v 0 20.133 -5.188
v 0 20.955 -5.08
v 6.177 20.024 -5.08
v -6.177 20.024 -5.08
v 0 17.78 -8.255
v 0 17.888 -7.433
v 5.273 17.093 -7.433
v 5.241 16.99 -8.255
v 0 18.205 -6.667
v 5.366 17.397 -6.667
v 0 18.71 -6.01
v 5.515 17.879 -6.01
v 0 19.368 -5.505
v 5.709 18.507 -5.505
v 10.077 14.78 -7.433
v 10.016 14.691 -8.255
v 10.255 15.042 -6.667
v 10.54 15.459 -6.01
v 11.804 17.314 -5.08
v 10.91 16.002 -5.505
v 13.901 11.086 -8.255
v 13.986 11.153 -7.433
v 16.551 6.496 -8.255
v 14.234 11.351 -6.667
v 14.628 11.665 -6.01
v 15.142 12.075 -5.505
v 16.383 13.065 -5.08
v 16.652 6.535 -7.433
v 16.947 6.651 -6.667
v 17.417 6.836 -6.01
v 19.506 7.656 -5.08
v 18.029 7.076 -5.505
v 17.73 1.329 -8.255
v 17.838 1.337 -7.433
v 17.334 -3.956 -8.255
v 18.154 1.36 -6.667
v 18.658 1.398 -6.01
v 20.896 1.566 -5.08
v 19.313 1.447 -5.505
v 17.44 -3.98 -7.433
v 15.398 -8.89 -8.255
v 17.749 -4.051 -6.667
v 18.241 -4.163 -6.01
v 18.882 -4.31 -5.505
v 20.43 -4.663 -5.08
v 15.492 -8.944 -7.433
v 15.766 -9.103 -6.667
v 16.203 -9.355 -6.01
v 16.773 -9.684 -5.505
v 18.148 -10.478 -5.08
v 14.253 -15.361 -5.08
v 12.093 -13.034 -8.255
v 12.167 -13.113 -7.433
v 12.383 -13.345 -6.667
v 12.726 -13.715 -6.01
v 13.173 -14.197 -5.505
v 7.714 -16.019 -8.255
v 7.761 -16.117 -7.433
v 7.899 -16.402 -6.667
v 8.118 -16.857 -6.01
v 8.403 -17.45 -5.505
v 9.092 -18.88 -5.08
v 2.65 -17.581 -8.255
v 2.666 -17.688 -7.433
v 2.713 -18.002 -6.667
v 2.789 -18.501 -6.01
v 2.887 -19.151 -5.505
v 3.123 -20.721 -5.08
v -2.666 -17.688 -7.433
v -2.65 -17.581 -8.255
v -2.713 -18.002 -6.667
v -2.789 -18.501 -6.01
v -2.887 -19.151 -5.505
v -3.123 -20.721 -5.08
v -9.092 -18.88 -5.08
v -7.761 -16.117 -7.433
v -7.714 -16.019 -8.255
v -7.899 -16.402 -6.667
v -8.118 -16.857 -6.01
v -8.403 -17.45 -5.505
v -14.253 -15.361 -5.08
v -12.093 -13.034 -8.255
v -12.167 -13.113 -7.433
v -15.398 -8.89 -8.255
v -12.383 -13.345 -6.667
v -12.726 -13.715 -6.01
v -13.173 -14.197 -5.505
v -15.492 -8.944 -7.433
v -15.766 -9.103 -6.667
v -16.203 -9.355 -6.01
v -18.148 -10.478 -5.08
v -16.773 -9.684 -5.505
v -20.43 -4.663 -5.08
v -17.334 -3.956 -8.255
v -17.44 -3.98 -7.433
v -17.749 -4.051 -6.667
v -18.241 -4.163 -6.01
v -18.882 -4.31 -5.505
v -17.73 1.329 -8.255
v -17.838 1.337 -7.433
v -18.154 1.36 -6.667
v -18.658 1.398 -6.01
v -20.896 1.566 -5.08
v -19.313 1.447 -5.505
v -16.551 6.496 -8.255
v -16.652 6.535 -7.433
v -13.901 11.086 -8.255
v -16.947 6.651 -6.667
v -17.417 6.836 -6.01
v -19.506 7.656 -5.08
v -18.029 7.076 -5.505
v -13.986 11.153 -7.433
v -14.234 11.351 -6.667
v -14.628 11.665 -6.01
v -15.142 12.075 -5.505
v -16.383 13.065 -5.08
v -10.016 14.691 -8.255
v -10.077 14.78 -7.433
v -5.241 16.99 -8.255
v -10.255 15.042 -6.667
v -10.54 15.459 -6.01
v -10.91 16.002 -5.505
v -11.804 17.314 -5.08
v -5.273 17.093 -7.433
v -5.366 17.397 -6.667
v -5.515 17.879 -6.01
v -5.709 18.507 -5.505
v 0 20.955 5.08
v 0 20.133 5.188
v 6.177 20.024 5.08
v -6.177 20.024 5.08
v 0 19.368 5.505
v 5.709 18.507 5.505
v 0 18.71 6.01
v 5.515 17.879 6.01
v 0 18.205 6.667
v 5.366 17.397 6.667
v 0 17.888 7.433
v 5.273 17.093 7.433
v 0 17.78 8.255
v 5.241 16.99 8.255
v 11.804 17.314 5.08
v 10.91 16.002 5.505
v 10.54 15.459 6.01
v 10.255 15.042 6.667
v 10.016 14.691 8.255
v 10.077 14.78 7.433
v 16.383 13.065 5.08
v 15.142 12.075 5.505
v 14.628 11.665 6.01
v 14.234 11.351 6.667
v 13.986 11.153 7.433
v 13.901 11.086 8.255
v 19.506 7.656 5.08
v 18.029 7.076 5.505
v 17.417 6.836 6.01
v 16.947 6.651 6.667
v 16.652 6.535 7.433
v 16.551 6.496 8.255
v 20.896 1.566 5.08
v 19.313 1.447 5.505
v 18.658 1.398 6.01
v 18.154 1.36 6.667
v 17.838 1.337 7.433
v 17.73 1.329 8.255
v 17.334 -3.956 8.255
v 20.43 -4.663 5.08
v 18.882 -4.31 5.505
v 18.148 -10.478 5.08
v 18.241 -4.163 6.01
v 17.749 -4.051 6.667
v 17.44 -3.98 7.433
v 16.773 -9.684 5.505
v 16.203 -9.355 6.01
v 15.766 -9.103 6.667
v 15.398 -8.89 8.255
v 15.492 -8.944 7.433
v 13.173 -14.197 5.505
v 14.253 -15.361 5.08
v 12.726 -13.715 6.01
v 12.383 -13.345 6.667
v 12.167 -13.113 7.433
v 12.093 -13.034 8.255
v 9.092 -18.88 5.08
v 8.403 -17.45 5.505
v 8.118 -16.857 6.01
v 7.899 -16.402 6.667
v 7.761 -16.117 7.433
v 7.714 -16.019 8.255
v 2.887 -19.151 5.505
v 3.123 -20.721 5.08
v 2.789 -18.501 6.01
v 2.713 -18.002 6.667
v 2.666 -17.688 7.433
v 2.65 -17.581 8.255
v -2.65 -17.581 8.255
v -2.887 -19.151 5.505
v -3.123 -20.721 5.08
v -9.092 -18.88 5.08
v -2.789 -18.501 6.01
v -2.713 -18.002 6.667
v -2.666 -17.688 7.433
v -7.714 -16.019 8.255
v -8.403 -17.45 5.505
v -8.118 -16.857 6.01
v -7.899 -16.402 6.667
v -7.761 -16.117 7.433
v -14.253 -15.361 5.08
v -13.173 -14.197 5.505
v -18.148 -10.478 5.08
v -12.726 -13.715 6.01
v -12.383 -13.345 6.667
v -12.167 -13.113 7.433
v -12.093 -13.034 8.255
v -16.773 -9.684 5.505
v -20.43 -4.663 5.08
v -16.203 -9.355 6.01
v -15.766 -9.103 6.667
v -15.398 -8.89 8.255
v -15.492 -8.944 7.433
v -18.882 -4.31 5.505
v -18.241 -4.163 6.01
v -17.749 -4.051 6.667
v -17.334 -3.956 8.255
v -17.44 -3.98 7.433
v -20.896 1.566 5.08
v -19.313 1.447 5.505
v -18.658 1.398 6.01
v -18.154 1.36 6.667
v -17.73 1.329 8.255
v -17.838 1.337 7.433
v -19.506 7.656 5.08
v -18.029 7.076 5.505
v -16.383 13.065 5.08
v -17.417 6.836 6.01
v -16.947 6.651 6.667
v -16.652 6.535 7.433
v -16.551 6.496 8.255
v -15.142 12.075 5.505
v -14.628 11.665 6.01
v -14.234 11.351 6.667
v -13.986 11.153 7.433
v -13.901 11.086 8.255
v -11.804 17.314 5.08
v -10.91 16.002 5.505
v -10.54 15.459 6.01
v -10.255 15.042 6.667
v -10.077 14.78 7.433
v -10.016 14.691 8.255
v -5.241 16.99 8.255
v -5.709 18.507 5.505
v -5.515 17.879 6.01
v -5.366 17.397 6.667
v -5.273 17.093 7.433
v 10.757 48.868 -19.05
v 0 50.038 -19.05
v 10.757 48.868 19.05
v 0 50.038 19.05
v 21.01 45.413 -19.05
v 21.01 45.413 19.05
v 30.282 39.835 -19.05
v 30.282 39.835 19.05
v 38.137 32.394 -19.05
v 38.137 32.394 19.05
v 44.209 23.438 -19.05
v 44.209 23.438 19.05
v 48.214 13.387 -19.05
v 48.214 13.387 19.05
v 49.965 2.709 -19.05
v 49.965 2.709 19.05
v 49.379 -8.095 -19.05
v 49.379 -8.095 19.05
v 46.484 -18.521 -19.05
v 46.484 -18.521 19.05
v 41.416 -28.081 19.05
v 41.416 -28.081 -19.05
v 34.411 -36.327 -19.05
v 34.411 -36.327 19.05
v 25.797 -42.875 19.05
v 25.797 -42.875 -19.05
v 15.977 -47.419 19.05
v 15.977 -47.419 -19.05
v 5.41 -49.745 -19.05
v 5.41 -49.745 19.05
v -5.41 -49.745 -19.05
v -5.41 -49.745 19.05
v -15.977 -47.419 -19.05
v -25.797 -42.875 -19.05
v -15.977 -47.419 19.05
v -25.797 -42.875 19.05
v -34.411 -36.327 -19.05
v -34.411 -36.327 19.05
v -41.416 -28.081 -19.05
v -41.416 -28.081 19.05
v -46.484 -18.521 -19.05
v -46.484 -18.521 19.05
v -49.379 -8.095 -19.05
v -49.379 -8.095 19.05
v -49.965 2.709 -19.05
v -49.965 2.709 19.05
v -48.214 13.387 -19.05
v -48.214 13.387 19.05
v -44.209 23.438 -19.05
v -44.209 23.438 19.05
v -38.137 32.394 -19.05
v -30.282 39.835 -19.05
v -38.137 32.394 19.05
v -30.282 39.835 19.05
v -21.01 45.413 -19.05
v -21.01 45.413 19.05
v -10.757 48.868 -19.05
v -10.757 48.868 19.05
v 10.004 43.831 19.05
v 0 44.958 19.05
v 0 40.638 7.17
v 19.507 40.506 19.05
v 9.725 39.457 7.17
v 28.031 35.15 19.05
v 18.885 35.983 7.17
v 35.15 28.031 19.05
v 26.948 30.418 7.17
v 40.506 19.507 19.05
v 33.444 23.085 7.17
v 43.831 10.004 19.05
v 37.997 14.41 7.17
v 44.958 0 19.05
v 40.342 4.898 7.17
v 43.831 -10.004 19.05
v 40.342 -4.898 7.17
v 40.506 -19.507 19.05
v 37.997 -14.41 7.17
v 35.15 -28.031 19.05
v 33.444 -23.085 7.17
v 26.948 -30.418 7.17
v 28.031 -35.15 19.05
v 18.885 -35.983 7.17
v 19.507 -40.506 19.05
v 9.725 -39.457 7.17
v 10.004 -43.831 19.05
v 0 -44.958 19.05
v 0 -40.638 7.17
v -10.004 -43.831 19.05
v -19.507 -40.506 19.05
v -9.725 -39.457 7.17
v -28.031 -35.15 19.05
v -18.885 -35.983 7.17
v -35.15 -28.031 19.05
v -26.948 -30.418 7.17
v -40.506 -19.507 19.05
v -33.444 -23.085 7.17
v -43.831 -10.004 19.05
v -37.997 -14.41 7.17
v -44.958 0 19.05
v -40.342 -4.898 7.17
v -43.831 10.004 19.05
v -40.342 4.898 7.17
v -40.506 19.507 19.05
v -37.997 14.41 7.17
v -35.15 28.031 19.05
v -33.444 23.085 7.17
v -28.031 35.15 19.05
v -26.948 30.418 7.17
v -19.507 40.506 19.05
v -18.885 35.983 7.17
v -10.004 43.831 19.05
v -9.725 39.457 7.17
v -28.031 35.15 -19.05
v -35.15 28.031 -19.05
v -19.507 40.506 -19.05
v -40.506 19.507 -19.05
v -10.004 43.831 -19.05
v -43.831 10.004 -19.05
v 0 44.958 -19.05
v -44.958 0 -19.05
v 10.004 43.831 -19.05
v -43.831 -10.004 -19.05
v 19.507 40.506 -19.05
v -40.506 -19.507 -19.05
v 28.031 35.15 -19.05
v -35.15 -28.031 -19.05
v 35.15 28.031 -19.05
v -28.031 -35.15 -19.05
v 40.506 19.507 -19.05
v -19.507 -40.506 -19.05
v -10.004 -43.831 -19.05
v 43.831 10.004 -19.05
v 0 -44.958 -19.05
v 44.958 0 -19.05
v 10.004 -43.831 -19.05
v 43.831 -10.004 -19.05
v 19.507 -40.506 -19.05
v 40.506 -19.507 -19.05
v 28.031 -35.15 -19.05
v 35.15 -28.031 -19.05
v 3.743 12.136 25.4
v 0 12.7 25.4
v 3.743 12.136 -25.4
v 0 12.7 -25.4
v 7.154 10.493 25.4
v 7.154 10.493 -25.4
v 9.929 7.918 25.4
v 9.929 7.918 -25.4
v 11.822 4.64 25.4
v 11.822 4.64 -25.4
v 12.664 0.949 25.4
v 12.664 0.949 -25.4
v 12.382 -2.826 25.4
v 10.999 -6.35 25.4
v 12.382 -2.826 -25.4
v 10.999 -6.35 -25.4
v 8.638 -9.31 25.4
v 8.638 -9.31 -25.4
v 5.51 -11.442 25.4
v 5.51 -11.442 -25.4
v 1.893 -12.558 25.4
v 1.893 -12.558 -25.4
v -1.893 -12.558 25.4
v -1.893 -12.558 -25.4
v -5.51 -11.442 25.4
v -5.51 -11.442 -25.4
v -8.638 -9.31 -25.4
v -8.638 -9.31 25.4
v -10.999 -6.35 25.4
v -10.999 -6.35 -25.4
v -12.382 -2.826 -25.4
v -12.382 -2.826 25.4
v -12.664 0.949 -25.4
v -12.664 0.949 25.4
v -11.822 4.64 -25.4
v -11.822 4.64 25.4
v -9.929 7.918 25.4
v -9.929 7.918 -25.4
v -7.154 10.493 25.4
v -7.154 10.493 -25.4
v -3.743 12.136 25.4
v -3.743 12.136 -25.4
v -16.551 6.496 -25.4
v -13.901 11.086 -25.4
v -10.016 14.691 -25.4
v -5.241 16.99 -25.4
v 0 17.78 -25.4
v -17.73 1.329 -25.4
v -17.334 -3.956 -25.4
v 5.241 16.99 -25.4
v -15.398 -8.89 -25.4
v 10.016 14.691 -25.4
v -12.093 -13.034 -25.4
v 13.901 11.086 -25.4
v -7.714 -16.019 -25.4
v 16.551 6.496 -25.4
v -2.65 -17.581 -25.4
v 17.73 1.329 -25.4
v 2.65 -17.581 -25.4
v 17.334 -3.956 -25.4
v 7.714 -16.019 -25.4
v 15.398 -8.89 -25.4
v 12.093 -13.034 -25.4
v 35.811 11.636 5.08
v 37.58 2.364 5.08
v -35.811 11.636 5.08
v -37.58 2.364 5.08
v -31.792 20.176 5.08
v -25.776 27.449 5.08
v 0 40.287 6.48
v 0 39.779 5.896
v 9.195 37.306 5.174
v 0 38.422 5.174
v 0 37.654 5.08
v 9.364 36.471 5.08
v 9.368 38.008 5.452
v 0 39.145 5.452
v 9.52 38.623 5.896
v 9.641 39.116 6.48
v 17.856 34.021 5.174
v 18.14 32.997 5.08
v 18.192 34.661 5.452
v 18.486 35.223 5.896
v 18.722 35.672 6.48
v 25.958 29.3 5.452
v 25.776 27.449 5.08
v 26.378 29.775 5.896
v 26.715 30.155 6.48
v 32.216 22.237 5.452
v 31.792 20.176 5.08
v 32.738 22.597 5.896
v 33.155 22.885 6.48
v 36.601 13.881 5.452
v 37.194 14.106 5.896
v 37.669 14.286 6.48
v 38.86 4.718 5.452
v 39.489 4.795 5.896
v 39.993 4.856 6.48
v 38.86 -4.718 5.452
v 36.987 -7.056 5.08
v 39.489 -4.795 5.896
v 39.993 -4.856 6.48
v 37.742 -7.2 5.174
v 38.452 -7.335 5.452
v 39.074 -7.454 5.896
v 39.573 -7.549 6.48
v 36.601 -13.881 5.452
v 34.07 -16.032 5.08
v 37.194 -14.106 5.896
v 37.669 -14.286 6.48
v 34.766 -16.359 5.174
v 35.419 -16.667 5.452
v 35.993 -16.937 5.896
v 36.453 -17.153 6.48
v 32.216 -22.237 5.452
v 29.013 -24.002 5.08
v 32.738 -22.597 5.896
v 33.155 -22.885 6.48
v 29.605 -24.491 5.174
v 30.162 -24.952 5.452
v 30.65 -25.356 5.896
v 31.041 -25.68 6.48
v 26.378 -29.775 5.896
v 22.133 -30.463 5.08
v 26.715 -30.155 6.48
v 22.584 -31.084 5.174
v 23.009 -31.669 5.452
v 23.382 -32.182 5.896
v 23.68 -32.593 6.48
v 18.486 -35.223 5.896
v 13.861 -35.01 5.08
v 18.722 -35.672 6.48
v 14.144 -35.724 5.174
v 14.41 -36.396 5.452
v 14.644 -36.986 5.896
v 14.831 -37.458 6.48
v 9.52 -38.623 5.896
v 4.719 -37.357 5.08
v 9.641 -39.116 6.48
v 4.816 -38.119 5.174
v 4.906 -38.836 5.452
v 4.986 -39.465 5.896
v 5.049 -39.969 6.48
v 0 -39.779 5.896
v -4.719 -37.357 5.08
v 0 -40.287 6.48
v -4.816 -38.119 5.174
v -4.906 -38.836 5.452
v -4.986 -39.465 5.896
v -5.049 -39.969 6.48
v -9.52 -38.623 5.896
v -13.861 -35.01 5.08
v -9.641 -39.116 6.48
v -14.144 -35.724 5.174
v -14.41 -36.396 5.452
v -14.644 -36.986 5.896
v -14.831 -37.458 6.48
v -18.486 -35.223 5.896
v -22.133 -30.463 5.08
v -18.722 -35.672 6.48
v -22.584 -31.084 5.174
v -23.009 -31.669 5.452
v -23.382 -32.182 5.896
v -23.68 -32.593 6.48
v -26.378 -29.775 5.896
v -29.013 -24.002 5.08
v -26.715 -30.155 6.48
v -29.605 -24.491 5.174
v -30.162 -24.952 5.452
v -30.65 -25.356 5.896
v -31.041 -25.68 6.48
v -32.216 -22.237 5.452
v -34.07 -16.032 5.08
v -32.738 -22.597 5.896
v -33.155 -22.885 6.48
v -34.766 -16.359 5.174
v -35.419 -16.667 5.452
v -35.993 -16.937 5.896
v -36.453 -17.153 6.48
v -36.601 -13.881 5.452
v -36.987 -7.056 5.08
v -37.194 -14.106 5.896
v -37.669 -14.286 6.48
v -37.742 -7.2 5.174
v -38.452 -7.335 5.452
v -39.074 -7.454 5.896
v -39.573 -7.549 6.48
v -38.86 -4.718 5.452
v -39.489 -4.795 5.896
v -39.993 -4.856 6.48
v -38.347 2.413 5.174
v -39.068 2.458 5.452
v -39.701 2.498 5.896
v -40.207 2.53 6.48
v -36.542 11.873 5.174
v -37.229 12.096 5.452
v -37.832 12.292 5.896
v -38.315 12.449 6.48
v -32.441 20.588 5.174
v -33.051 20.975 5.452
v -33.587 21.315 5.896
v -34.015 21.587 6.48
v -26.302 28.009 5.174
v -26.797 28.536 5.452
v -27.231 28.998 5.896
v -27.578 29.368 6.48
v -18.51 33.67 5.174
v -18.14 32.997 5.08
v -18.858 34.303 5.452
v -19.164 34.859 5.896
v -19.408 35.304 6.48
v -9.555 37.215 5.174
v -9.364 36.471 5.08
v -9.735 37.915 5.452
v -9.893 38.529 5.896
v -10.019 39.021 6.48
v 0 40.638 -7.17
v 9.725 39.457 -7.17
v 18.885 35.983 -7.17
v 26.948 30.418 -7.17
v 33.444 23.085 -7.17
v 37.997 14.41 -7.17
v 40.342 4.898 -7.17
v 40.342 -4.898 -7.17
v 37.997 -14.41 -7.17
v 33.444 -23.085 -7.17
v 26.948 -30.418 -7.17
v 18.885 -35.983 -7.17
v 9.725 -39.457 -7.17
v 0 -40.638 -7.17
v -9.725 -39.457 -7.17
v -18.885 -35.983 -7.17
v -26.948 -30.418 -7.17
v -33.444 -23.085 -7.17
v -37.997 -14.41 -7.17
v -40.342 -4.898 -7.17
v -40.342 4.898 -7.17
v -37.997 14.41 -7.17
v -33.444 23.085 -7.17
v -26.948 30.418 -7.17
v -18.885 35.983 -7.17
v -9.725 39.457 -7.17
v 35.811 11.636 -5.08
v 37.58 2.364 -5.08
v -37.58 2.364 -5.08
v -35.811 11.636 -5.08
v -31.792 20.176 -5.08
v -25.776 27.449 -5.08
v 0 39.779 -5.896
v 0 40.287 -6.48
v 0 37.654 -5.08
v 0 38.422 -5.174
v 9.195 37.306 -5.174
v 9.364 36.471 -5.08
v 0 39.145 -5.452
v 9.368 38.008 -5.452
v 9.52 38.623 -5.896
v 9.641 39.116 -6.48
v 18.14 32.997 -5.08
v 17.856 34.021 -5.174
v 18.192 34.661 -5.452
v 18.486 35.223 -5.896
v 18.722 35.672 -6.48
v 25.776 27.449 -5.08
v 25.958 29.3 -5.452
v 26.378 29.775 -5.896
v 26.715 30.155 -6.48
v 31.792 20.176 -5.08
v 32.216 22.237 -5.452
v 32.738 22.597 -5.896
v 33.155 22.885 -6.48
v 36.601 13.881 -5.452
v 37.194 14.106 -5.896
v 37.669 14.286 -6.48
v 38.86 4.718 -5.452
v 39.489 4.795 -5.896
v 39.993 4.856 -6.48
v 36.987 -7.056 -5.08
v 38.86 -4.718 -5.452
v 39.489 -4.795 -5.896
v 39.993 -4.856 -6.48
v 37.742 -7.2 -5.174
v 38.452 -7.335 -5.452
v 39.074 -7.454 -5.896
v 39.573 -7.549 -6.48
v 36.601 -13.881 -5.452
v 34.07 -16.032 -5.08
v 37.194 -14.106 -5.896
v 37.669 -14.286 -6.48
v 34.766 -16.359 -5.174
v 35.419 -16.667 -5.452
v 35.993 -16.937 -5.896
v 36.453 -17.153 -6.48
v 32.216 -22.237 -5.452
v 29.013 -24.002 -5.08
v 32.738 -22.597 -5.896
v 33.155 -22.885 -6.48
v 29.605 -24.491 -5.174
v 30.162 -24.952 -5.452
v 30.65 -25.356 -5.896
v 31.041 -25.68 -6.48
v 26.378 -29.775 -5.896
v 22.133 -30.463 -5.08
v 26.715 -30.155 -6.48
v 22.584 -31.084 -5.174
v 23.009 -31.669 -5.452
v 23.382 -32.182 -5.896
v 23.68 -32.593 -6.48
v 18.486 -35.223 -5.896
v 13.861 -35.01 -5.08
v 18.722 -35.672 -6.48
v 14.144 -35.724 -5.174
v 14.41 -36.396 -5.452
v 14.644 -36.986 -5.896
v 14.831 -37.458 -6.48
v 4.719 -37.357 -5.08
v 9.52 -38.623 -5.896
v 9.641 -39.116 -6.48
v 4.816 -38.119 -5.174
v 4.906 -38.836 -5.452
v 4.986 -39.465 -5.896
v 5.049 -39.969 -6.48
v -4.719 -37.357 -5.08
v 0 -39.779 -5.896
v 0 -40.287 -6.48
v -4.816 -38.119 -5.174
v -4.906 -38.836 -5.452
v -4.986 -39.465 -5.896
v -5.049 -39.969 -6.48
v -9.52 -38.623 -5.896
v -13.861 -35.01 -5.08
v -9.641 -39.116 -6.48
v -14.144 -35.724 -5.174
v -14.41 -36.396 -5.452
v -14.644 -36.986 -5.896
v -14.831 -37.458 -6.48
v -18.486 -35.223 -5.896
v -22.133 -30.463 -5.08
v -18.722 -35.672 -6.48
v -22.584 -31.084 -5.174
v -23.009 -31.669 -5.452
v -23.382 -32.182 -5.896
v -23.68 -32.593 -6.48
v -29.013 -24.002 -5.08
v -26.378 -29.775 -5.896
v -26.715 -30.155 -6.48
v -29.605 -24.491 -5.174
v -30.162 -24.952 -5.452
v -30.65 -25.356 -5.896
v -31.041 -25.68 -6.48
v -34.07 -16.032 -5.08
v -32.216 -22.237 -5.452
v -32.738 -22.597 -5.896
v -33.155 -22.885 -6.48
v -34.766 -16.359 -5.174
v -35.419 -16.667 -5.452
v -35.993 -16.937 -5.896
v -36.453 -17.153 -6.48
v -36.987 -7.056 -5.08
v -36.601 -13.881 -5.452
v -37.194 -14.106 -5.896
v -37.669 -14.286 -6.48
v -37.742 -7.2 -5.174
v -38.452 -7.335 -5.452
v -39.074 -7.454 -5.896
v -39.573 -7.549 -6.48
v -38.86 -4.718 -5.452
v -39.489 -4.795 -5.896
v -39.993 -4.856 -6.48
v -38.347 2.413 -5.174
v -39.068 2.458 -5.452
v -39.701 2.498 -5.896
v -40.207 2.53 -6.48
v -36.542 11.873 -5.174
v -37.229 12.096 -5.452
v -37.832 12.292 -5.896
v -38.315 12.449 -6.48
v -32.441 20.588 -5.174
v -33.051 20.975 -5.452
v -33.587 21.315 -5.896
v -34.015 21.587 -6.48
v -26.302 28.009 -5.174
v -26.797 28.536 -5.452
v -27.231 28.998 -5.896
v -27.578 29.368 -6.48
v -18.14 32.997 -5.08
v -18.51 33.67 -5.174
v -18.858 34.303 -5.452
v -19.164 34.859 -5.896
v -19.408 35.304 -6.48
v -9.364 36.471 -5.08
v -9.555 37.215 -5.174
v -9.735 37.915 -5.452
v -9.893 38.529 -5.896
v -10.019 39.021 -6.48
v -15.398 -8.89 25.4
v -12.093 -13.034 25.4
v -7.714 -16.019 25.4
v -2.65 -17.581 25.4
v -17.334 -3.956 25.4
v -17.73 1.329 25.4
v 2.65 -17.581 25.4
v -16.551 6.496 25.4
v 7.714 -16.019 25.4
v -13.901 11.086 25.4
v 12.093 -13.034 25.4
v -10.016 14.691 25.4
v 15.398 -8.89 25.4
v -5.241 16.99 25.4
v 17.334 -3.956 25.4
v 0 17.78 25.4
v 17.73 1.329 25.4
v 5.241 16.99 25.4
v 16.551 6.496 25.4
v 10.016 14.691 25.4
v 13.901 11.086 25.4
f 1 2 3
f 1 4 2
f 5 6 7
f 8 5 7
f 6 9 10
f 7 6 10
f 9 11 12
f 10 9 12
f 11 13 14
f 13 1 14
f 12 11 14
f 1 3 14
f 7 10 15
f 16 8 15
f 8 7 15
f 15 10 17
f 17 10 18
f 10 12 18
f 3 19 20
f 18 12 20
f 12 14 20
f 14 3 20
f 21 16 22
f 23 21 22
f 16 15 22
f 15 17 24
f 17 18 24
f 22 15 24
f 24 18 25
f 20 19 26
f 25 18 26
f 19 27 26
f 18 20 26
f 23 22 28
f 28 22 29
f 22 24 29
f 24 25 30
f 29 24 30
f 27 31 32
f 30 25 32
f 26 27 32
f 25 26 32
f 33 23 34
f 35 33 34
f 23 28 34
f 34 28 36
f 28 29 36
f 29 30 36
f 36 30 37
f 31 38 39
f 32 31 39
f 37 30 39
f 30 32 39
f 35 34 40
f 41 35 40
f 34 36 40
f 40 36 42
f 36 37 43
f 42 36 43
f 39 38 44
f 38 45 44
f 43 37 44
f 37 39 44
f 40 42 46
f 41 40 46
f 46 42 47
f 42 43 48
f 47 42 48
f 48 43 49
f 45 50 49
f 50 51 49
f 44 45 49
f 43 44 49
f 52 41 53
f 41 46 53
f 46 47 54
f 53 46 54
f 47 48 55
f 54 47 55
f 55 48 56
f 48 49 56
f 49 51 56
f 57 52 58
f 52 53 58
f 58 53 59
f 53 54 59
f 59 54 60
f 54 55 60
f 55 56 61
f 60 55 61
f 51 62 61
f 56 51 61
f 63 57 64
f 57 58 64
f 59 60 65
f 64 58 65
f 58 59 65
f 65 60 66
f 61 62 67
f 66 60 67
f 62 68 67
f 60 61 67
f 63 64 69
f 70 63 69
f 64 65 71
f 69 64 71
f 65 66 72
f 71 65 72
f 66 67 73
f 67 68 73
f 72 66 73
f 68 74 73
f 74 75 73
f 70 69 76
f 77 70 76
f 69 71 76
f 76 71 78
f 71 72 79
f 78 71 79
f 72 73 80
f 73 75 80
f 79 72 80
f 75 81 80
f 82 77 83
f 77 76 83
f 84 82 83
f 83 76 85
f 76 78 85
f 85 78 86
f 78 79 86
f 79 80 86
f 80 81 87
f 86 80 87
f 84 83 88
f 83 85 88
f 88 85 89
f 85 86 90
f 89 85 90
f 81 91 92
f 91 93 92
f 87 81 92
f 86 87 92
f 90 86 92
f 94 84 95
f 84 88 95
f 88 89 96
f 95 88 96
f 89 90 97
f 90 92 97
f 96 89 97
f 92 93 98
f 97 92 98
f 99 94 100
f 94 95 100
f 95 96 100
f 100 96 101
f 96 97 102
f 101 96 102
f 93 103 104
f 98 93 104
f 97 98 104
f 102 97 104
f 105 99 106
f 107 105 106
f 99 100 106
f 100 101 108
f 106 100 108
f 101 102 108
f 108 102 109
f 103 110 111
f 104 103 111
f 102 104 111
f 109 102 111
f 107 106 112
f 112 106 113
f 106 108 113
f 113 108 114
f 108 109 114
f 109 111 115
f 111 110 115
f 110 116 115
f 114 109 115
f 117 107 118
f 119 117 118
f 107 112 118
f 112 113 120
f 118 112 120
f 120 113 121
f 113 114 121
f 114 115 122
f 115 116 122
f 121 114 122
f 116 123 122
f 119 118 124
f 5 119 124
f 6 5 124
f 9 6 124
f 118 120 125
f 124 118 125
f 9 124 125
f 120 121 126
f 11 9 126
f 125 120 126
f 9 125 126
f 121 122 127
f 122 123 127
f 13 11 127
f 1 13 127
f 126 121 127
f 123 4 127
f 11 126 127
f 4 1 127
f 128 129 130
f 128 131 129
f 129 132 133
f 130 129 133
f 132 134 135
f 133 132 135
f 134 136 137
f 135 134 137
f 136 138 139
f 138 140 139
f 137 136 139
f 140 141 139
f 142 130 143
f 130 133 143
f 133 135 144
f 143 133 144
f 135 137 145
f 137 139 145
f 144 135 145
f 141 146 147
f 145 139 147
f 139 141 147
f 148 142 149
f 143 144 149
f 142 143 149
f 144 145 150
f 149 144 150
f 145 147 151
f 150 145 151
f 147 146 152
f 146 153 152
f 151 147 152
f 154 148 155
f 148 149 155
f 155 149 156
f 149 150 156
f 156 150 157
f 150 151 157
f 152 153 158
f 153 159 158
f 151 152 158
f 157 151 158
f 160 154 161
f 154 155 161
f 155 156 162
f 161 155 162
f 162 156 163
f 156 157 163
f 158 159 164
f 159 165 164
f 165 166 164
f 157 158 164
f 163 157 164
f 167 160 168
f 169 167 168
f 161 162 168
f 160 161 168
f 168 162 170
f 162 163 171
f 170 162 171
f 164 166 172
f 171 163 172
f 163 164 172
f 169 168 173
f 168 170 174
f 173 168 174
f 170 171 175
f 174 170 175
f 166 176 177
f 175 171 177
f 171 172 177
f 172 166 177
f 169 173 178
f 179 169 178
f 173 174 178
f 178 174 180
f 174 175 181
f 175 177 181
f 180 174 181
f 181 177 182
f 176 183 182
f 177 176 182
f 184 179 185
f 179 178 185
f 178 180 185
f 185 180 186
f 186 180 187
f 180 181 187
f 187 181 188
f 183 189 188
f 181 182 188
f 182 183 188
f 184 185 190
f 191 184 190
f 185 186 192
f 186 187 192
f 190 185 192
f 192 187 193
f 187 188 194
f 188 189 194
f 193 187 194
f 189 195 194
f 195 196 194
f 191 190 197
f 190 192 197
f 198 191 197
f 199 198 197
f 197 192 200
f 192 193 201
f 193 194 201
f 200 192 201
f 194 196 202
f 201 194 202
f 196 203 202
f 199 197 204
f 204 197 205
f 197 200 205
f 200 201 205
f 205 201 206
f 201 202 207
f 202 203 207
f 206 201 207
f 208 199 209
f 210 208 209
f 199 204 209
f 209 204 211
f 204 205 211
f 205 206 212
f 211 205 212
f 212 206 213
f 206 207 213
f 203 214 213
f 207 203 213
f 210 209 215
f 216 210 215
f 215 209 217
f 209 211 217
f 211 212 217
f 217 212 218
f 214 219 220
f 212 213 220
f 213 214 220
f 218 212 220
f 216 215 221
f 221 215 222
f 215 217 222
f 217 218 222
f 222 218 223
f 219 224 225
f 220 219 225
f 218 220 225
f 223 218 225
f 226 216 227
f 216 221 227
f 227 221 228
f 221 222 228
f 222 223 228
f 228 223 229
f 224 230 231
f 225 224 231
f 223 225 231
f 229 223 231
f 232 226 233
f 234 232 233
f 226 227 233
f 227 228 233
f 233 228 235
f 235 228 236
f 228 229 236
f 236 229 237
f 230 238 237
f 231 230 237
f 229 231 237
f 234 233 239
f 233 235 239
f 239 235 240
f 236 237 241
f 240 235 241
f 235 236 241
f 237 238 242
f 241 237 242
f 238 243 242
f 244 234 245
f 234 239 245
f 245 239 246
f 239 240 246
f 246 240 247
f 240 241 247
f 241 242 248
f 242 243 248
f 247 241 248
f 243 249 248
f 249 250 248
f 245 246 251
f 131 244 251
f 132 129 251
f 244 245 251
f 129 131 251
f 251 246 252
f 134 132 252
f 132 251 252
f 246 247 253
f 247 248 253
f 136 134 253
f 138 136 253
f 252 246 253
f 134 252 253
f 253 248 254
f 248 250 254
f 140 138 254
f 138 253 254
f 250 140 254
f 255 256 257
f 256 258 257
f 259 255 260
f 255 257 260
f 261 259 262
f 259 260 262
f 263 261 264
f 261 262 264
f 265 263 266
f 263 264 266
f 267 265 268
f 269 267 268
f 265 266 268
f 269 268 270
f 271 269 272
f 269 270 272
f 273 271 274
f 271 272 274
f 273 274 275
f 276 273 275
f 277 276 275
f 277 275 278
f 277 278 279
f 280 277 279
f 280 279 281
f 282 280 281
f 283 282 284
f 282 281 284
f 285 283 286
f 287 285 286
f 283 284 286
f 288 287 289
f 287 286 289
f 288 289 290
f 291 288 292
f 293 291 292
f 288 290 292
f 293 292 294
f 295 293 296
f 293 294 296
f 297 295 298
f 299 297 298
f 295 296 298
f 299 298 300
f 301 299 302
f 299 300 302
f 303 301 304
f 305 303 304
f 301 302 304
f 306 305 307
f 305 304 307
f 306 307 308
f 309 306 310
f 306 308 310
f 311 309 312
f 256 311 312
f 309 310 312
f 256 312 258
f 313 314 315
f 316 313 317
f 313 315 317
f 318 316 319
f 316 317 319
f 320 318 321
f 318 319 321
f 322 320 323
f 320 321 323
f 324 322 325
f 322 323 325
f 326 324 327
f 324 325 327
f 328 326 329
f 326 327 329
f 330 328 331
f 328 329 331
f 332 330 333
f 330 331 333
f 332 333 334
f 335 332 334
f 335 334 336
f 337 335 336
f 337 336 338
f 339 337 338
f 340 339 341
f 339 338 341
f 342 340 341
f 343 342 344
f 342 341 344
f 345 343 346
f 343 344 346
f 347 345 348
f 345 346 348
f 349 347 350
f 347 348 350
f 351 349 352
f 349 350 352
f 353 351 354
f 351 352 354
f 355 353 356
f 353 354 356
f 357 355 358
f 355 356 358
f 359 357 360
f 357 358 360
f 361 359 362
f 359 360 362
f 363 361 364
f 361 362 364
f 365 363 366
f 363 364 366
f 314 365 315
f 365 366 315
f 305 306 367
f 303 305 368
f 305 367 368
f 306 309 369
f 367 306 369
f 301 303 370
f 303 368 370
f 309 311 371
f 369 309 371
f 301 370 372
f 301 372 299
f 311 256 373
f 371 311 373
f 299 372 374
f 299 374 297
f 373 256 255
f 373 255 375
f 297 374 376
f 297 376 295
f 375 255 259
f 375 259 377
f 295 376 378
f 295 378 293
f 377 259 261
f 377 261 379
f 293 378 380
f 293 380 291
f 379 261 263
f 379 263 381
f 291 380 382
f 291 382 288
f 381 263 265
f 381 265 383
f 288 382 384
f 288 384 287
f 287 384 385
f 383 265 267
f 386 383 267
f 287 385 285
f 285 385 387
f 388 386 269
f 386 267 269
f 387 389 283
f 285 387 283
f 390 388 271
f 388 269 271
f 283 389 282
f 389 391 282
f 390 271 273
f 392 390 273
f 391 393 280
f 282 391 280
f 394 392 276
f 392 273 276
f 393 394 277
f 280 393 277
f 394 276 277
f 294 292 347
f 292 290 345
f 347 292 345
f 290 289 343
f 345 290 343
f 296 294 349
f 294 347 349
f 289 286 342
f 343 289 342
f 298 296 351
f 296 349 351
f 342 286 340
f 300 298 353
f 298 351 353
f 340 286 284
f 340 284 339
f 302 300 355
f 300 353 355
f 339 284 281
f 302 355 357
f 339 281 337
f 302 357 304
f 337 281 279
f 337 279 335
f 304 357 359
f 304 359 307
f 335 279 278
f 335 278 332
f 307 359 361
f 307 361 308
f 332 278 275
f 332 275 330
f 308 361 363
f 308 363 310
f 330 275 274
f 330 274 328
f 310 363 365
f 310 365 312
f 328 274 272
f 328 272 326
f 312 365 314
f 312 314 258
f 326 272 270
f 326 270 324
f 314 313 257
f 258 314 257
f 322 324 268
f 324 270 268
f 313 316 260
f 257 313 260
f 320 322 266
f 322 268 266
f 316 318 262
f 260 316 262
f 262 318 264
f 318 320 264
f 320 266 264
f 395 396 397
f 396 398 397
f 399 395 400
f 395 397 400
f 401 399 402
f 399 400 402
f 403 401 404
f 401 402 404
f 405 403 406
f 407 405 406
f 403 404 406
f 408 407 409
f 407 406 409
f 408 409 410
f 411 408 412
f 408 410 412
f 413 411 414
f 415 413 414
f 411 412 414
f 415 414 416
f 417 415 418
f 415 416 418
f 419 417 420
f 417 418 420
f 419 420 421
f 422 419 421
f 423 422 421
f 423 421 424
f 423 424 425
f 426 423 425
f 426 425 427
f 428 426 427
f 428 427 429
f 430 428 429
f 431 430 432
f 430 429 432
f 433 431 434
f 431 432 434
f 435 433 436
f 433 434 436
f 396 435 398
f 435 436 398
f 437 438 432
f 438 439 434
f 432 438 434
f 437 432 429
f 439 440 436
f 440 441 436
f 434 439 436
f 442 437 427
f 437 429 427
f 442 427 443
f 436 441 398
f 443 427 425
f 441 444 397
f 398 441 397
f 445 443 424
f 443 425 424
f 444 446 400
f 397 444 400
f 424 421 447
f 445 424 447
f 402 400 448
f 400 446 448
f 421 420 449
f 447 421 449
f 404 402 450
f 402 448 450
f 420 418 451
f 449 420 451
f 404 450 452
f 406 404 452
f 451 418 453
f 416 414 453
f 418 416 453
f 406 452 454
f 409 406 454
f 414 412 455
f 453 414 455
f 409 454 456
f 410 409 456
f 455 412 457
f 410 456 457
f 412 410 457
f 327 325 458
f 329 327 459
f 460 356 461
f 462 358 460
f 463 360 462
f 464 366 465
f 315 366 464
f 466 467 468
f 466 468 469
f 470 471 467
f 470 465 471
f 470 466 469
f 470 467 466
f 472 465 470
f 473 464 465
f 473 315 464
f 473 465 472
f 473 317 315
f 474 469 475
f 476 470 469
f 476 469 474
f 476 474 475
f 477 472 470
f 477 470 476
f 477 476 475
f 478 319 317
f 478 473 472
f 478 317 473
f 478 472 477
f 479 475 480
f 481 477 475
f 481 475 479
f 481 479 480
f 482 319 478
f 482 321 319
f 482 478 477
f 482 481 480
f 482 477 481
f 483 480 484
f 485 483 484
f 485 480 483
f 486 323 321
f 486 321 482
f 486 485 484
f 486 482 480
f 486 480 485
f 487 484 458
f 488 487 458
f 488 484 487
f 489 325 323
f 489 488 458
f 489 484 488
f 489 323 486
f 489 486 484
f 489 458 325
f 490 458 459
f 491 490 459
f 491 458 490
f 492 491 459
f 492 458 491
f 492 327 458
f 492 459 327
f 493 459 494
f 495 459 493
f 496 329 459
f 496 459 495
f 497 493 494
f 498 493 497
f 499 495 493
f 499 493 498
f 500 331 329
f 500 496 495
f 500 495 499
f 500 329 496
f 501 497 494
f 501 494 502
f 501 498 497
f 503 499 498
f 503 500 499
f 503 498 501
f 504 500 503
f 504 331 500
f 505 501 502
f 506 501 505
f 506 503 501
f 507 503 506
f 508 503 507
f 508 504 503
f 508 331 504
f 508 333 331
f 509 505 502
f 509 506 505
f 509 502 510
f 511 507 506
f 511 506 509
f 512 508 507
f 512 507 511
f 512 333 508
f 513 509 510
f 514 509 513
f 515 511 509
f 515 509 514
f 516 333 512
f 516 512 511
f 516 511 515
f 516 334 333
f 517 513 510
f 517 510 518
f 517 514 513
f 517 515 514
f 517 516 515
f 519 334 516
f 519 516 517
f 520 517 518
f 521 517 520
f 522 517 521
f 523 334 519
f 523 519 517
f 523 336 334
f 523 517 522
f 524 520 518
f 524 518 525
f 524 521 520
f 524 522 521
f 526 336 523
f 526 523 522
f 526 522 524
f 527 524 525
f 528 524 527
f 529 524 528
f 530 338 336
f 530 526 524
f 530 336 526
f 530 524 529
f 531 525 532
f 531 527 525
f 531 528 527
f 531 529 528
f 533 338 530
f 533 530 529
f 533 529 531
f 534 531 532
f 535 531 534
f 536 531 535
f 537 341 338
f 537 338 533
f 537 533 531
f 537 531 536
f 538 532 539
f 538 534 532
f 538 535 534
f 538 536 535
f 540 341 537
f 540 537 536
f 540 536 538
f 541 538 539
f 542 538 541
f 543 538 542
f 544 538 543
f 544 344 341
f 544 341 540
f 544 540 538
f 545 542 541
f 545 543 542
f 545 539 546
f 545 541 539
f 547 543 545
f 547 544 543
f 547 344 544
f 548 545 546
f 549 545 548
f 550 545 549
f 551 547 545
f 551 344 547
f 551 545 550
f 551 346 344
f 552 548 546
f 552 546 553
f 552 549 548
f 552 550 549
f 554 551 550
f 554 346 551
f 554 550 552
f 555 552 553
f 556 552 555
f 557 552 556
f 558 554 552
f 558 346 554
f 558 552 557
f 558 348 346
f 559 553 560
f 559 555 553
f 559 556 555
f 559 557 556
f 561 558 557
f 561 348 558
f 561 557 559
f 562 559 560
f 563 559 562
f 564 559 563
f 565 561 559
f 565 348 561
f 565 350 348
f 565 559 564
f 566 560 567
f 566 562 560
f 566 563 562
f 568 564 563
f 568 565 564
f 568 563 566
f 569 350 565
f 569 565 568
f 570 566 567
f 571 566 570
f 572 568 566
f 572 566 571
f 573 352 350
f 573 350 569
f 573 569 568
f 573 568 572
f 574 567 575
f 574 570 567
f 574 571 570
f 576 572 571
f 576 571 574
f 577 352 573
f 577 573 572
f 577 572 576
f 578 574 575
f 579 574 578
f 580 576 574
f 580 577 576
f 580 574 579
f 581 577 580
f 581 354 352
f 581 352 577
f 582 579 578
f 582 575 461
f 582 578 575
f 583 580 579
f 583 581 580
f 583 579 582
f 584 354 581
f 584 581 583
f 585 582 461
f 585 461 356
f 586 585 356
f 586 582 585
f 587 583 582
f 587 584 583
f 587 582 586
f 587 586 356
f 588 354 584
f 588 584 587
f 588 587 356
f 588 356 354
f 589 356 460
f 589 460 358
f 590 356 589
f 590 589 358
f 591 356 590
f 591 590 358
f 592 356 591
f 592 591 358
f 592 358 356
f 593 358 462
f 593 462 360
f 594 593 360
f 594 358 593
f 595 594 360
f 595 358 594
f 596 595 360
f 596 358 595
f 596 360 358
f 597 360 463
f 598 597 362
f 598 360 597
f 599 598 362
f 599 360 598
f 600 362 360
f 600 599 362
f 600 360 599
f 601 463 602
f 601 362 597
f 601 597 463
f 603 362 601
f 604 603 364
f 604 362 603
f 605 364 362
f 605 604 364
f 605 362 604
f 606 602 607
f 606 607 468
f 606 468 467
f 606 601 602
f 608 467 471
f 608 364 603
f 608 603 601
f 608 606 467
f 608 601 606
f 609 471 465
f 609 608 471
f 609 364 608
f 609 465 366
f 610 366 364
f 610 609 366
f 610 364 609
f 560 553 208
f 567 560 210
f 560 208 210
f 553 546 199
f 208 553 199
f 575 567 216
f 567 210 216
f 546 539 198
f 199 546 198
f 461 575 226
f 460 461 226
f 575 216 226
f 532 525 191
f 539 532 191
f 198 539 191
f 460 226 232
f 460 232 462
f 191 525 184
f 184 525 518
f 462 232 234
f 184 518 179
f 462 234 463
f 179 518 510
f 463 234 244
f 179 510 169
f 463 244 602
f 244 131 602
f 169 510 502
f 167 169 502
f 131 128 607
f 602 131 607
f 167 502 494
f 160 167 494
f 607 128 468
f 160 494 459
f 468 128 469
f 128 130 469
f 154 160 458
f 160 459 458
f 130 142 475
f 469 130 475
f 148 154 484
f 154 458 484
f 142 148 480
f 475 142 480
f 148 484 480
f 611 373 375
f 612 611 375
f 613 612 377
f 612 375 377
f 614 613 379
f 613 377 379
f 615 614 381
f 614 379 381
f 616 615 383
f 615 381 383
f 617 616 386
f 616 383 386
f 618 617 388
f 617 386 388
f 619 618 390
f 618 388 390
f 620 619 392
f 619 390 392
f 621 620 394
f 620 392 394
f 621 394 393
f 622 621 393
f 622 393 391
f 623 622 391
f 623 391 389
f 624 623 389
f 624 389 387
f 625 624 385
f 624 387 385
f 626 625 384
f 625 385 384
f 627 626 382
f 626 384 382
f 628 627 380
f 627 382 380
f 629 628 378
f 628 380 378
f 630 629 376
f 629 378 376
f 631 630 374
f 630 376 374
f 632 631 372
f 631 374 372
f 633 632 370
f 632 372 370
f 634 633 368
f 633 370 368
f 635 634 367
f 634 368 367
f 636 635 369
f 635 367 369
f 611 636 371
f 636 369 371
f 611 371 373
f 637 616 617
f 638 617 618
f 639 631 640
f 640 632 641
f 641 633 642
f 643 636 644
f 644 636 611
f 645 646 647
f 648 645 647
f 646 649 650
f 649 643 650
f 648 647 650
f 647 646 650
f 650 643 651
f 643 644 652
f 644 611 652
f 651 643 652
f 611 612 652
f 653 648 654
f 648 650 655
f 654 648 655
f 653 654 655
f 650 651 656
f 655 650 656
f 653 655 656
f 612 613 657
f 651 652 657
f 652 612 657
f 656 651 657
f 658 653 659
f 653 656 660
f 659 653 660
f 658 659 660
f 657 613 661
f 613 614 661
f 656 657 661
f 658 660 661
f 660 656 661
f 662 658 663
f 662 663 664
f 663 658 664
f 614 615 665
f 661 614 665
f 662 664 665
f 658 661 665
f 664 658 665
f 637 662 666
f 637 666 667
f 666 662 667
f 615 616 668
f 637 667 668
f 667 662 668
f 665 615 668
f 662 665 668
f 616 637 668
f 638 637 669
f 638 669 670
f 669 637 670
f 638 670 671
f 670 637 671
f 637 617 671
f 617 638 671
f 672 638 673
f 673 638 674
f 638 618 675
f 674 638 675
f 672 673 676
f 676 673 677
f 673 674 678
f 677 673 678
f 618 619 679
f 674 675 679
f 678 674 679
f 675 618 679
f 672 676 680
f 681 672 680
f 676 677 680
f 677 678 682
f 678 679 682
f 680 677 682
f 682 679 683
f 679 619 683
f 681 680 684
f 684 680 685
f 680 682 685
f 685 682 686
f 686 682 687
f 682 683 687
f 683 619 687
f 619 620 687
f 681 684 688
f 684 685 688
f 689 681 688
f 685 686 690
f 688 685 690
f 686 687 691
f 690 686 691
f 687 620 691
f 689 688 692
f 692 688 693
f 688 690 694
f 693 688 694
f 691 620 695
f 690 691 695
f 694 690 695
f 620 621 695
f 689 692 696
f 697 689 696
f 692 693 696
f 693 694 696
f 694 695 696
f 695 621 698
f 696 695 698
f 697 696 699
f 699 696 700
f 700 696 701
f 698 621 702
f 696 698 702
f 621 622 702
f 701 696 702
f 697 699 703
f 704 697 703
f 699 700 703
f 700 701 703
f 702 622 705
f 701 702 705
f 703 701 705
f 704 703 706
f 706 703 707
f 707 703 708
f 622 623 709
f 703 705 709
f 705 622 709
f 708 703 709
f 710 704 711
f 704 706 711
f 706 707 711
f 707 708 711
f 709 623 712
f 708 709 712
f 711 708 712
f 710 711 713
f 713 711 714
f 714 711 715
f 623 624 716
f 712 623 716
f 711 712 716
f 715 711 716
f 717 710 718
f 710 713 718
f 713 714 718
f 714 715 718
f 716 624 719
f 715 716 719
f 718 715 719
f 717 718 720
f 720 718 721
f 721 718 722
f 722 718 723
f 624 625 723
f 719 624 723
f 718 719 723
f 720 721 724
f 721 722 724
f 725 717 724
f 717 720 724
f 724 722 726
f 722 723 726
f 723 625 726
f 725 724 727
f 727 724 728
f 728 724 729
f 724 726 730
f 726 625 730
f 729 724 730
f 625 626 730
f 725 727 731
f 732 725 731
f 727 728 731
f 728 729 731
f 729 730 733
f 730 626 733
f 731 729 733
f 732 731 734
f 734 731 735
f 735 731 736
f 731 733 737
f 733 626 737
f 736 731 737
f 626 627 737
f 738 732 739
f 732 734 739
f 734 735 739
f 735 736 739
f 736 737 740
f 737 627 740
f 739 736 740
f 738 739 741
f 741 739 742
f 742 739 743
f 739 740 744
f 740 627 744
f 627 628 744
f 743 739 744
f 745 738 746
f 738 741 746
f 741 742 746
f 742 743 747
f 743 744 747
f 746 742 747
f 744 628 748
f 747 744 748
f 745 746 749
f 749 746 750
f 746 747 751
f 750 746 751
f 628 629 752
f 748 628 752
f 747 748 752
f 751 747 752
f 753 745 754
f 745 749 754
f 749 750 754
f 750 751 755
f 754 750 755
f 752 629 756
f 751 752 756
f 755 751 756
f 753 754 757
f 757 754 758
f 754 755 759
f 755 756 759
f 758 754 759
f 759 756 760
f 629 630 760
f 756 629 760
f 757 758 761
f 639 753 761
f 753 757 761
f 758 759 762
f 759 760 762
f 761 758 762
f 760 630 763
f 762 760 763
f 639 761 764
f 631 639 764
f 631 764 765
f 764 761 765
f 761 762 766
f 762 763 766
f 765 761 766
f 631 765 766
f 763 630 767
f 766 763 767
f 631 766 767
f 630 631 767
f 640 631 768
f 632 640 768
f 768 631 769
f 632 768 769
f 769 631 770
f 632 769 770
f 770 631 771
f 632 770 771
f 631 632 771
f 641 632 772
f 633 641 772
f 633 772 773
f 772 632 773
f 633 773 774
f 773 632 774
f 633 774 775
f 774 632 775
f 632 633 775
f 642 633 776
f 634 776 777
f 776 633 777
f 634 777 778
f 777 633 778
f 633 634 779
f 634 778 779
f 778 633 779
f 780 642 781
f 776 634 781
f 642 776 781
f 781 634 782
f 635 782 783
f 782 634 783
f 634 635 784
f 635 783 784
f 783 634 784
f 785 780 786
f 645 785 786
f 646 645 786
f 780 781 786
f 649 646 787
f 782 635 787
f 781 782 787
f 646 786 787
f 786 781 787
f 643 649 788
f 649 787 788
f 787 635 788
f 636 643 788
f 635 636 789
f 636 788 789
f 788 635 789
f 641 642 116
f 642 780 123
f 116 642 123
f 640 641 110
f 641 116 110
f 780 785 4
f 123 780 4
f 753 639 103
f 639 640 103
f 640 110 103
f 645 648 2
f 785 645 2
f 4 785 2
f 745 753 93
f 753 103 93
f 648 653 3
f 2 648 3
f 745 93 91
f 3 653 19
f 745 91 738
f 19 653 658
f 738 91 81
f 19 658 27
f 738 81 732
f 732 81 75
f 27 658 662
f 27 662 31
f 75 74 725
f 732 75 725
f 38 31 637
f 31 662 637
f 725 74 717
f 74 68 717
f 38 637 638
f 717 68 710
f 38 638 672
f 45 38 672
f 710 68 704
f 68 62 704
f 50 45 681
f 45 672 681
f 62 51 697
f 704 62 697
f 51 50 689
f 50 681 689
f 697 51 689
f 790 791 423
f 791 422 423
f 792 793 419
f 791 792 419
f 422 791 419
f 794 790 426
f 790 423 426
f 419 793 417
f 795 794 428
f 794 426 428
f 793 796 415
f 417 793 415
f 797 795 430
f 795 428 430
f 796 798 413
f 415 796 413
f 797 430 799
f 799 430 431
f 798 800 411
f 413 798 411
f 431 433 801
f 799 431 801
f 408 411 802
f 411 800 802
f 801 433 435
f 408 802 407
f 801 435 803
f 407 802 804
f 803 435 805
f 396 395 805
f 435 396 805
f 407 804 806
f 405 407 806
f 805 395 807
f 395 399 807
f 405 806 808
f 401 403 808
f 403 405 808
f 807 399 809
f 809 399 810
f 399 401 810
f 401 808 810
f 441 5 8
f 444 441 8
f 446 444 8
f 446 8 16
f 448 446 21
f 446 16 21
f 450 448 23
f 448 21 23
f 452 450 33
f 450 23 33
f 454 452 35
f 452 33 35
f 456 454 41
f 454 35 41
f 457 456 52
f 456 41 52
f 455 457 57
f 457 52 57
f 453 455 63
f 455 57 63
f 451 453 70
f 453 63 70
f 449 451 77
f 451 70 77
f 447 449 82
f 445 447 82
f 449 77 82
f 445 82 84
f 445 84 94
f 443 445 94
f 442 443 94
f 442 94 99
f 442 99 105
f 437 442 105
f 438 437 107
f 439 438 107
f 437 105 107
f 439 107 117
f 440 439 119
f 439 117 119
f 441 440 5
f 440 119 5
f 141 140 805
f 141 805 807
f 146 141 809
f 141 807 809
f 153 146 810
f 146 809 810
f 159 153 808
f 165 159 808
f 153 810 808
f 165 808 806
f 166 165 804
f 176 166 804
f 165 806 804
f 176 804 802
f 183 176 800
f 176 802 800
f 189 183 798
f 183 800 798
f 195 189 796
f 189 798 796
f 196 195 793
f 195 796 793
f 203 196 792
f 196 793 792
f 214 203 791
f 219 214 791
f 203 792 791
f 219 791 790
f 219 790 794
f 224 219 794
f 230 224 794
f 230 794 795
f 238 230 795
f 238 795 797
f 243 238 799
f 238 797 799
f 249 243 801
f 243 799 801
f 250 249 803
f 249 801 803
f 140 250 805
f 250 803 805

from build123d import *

# Parameters (mm, degrees)
FILLET1_R = 3.175
FILLET2_R = 3.175
FILLET3_R = 3.175
FILLET4_R = 3.175


with BuildPart() as part:
    # Sketch1 → Revolve1 (revolve)
    with BuildSketch(Plane(origin=(0, 0, 0), x_dir=(0, 0, -1), z_dir=(1, 0, 0))):
        Polygon((-25.4, 12.7), (25.4, 12.7), (25.4, 17.78), (5.08, 17.78), (5.08, 39.878), (19.05, 44.958), (19.05, 50.038), (-19.05, 50.038), (-19.05, 44.958), (-5.08, 39.878), (-5.08, 17.78), (-25.4, 17.78), align=None)
    revolve(axis=Axis((0, 0, 55.673126484), (0, 0, -1)))

    # Fillet1
    fillet1_edges = [part.edges().sort_by_distance(p)[0] for p in [
        (0, -17.78, 5.08),
    ]]
    fillet(fillet1_edges, radius=FILLET1_R)

    # Fillet2
    fillet2_edges = [part.edges().sort_by_distance(p)[0] for p in [
        (0, -39.878, 5.08),
    ]]
    fillet(fillet2_edges, radius=FILLET2_R)

    # Fillet3
    fillet3_edges = [part.edges().sort_by_distance(p)[0] for p in [
        (0, -17.78, -5.08),
    ]]
    fillet(fillet3_edges, radius=FILLET3_R)

    # Fillet4
    fillet4_edges = [part.edges().sort_by_distance(p)[0] for p in [
        (0, -39.878, -5.08),
    ]]
    fillet(fillet4_edges, radius=FILLET4_R)


solid = part.part
